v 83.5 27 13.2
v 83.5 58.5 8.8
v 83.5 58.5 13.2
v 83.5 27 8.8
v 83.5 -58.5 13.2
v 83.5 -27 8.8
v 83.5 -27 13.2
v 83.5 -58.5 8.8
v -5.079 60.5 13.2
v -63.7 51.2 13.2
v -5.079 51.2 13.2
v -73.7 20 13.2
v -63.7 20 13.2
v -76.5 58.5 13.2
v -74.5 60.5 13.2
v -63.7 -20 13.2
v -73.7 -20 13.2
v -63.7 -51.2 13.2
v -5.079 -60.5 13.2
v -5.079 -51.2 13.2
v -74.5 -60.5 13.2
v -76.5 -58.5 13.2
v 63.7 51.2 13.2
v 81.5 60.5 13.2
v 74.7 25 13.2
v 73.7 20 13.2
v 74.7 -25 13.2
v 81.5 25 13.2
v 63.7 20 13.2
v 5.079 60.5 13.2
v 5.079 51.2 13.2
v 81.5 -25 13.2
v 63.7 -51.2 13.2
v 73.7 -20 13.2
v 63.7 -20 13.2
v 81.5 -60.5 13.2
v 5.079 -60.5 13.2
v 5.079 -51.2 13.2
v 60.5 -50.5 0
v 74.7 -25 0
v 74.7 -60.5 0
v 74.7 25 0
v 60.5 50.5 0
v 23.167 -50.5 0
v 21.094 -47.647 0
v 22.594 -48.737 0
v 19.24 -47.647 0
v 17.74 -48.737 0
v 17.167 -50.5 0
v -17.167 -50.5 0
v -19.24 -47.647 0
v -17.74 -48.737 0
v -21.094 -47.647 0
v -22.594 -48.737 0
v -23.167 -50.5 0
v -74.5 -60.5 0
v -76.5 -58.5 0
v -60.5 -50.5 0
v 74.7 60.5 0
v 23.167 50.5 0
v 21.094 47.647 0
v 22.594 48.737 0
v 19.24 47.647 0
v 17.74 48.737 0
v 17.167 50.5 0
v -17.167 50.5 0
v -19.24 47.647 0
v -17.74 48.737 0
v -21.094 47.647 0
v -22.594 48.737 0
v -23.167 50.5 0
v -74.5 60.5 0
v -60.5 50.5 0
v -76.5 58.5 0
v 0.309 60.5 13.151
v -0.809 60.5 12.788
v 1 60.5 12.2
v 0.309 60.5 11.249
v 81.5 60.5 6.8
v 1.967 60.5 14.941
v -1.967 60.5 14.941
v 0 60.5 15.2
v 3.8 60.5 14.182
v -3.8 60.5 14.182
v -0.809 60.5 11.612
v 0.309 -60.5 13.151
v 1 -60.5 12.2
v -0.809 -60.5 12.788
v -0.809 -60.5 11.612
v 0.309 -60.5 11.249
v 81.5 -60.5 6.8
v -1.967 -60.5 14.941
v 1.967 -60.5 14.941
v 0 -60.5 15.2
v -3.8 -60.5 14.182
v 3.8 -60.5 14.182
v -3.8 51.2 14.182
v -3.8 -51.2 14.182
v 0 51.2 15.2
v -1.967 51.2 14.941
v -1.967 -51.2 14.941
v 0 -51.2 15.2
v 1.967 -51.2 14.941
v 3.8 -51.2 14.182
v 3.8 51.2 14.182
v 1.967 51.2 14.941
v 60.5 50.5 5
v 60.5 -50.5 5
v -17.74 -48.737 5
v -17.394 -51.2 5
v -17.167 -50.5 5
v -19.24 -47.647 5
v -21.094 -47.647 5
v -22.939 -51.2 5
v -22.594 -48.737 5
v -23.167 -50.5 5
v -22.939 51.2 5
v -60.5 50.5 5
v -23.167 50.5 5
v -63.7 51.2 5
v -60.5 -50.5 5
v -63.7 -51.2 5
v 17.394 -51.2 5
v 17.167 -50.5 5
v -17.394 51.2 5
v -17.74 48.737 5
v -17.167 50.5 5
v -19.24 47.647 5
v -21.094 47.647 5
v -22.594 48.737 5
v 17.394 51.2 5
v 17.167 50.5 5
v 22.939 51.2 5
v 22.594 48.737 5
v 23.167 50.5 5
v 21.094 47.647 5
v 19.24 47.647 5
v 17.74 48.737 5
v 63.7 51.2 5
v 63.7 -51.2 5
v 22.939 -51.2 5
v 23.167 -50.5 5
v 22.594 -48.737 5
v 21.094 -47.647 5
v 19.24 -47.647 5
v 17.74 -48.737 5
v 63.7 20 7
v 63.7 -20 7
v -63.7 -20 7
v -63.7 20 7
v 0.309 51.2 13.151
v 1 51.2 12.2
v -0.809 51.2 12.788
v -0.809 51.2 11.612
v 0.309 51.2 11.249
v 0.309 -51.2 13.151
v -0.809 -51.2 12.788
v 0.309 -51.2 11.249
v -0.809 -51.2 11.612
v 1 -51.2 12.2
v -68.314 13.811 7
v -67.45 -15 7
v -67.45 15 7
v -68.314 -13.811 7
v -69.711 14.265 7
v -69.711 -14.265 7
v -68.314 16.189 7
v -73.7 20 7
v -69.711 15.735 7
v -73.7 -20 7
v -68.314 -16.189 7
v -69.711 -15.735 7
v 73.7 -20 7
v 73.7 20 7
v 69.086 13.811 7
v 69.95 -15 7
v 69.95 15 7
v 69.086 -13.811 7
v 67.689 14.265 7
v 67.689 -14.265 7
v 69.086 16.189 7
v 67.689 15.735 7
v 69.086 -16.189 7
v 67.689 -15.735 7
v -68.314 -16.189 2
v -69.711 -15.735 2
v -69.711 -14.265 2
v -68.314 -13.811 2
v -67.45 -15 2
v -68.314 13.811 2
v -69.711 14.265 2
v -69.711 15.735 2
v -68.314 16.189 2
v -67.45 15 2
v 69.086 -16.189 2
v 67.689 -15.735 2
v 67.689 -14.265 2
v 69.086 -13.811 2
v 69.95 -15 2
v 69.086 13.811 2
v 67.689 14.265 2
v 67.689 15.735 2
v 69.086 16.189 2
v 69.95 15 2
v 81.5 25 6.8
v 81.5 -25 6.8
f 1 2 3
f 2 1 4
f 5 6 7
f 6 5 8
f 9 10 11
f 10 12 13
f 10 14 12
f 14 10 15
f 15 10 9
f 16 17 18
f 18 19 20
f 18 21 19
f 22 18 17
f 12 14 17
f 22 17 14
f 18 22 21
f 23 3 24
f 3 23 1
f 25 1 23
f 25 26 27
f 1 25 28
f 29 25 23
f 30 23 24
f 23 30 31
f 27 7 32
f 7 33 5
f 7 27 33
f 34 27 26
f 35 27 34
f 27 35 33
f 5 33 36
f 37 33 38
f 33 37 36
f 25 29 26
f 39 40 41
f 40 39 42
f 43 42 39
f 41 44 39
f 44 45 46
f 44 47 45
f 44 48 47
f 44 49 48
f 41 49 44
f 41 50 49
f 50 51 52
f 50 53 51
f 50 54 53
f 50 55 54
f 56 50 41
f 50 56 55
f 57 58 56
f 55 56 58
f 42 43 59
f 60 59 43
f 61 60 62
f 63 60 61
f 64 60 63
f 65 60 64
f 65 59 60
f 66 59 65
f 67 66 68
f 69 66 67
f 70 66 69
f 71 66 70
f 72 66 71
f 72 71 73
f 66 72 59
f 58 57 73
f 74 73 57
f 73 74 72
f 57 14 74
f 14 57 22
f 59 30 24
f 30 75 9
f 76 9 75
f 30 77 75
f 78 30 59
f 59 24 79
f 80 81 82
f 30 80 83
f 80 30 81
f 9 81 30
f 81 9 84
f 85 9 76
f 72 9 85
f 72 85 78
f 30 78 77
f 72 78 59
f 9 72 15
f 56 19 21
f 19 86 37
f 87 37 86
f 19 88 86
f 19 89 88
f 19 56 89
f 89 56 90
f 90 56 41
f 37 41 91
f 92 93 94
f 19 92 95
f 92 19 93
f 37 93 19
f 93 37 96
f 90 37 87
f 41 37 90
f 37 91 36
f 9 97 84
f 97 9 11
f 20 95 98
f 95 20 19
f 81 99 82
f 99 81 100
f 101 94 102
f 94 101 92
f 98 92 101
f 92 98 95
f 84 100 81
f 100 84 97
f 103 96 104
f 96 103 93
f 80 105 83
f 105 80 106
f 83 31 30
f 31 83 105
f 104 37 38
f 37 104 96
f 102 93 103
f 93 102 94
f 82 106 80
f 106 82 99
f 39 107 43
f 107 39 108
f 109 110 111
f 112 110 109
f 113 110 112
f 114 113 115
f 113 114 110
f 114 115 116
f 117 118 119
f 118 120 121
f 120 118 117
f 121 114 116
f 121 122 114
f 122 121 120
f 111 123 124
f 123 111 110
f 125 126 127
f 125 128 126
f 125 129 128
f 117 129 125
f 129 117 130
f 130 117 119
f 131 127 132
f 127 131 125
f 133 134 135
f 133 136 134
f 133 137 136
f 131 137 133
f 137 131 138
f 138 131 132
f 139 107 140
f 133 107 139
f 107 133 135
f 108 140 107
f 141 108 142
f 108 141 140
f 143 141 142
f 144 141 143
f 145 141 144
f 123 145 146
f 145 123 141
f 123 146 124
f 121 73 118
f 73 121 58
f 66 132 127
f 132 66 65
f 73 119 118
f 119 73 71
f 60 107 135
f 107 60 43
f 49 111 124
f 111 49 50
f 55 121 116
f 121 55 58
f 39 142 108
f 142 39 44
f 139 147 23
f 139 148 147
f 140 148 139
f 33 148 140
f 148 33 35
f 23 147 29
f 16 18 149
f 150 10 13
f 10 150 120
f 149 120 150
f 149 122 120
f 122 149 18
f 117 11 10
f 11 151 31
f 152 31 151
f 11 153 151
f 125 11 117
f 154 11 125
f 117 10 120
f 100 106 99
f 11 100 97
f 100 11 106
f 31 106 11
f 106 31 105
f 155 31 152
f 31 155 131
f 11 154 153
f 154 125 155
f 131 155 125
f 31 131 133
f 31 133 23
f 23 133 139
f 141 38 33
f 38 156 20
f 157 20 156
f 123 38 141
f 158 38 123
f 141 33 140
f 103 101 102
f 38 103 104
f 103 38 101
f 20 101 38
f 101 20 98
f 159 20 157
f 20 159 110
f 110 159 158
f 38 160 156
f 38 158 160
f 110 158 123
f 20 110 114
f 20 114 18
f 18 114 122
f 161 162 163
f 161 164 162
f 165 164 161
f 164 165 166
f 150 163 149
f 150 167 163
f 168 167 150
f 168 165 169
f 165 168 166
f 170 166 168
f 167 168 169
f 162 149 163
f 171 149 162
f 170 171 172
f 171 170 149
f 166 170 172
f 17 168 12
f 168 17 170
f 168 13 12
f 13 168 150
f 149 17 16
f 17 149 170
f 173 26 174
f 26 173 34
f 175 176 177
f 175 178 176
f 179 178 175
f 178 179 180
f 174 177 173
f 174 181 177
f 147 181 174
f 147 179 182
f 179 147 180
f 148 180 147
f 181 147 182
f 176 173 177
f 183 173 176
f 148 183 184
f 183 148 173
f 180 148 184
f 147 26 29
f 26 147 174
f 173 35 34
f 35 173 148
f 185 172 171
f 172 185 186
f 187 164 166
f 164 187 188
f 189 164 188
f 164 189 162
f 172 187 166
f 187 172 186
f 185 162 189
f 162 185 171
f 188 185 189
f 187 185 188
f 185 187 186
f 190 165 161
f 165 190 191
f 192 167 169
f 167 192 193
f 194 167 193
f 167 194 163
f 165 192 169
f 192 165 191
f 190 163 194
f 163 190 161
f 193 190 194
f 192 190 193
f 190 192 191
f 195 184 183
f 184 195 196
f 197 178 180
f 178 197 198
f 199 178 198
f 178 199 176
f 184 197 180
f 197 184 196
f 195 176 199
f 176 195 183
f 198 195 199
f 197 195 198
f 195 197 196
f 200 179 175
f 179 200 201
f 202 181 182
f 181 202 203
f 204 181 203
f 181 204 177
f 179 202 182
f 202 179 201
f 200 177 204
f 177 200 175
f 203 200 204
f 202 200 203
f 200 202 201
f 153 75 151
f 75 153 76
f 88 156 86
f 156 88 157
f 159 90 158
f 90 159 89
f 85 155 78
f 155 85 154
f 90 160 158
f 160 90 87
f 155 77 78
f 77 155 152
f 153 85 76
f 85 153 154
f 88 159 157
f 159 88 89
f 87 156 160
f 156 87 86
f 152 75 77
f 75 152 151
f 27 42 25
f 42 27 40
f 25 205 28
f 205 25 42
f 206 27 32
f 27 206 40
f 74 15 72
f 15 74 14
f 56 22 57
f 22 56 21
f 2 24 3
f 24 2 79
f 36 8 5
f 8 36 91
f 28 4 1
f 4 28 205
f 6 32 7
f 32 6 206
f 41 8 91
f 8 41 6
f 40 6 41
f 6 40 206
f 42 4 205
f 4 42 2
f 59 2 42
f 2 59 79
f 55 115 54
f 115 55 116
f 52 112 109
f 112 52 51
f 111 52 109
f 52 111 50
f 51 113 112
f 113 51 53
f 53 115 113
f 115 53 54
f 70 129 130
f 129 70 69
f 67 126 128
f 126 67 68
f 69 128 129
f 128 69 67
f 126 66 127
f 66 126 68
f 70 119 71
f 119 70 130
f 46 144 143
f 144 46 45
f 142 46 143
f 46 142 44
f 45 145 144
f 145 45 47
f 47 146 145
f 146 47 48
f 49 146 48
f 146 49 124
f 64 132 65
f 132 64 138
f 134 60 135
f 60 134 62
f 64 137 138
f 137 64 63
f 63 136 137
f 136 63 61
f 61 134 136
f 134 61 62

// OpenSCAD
// file: config_4x5.scad
/*
This is the base configuration file for the 4x5" format
# we are not using the exact ANSI measures, but slightly rounded measures for slight simplification
*/
vStabilizerTotal_h = 7;

// general tolerance
vTolerance = 0.2;

// sheet film and cassette measurements (roughly based on the ANSI measurements)
vFilmSheet_l = 127;
vFilmSheet_w = 102;
vCassette_l = 160; // A min
vCassette_w = 121; // B max
vCassette_h = 13.2; // C max
vLightTrap_l = 2; // M2
vLightTrap_w = vCassette_w;
vLightTrap_h = 1.5; // M1
vLightTrap_offsetX = 141; // G max
vFilmWindow_l = 121;
vFilmWindow_w = 101;
vFilmWindow_offsetX = 16;
vGroundGlass_offsetZ = 5;

// Graflok
vGraflok_h = 6; // this is not the official measurement, just measured from a camera 

// lens board measures (we are using Wista/Technika-style lensboards)
vLensboard_l = 100;
vLensboard_w = 97;
vLensboard_h = 2;
vLensboard_offsetX = -(vLensboard_l+3)/2; // caution: we have an asymetric offset!
vLensboard_offsetY = -vLensboard_w/2;
vLensboardHole_d = 85;
vLensboardLighttrap_d = 89;
vLensboardLighttrap_h = 1+vTolerance;

// bellows frame measures - the bellows frame design is derived from standardcameras.com
// back frame
vBellowsBackInner_l = 144; //???? check and replace with the measurement from your bellows!
vBellowsBackInner_w = vBellowsBackInner_l;
vBellowsBackOuter_l = vBellowsBackInner_l+1;
vBellowsBackOuter_w = vBellowsBackOuter_l;

vBellowsBackFrameOuter_l = 159;
vBellowsBackFrameOuter_w = vBellowsBackFrameOuter_l;
vBellowsBackFrameOuter_h = 7;
vBellowsBackFrameInner_l = 135;
vBellowsBackFrameInner_w = vBellowsBackFrameInner_l;
vBellowsBackFrameInner_h = 5;

vBellowsBackLightTrapOuter_l = vBellowsBackFrameInner_l+2*2;
vBellowsBackLightTrapOuter_w = vBellowsBackLightTrapOuter_l;
vBellowsBackLightTrap_h = 3;

vBellowsBackFrameScrewHole_d = 2;
vBellowsBackFrameScrewHole_h = 10;
vBellowsBackFrameScrewHole_offsetXY = 70;
vBellowsBackFrameScrewHole_offsetZ = vBellowsBackFrameOuter_h/2;

// front frame
vBellowsFrontInner_l = 94; //???? check and replace with the measurement from your bellows!
vBellowsFrontInner_w = vBellowsFrontInner_l;
vBellowsFrontOuter_l = vBellowsFrontInner_l+1;
vBellowsFrontOuter_w = vBellowsFrontOuter_l;

vBellowsFrontFrameOuter_l = 104;
vBellowsFrontFrameOuter_w = vBellowsFrontFrameOuter_l;
vBellowsFrontFrameOuter_h = 7;
vBellowsFrontFrameInner_l = 82;
vBellowsFrontFrameInner_w = vBellowsFrontFrameInner_l;
vBellowsFrontFrameInner_h = 5;

vBellowsFrontLightTrapOuter_l = vBellowsFrontFrameInner_l+2*2;
vBellowsFrontLightTrapOuter_w = vBellowsFrontLightTrapOuter_l;
vBellowsFrontLightTrap_h = 0;

vBellowsFrontFrameScrewHole_d = 2;
vBellowsFrontFrameScrewHole_h = 10;
vBellowsFrontFrameScrewHole_offsetXY = 40;
vBellowsFrontFrameScrewHole_offsetZ = vBellowsFrontFrameOuter_h/2;

// body dimensions
vWall_strength = 5;
vBodyOuter_l = 185; // make sure this is at least 4*vWall_strength larger than vBellowsBackFrameOuter_l!
vBodyOuter_w = 170; // make sure this is at least 2*vWall_strength larger than vBellowsBackFrameOuter_l!
vBodyOuter_h = 65;
vBodyEdge_r = vWall_strength;

// we will center our model on the Y axis and on the center of the bellows frame
// at least for the 4x5 version, we have to do an asymetric offset of 2.5mm on the X-axis 
vAsymOffsetX = -2.5;  

// back plate
vBackPlateLength = 160; // we will probably use about the same size as the bellows back frame
vBackPlateStrength = vWall_strength;

// hinges for front lid
vHingeInnerDistance = 100;
vHingeBaseWidth = 20;
vHingeHole = 5;

// lid lock measures
vLidLockBase_d = 8;
vLidLockHole_distance = 70;

// rail dimensions
vLowerRail_w = 90;
vUpperRail_w = vLowerRail_w;

// cutout for stop indents
vStopIndent_l = 4;
vStopIndent_h = 5;
vStopIndentDistance = 25; // shorter than 25 is not necessary
vStopIndent_offsetX = 20; // don't go shorter than 20 if you intend to use a 90mm lens!

// for all dovetails we use a base width of 5mm and a base height of 5mm
// we are applying tolerances to the inner AND outer part of a dovetail, in width and height
vDoveTail_w = 5;
vDoveTail_h = 5;
vDoveTail_tolerance = 0.2;

// front standard carrier / slider
// width is depending on vUpperRail_w
vSliderBase_w = vUpperRail_w + (4*vDoveTail_w);
vSliderBase_l = 40; // make sure to have enough space in the body.


// lever plate 
vLeverPlateBase_w = vUpperRail_w - (8*vDoveTail_w);
vLeverPlateBlock_w = 25;
vLeverPlateBlock_l = vSliderBase_l-(2*vDoveTail_w);

vFrontStandard_h = 130;
vFrontStandardSlot_h = vFrontStandard_h - 30;

// lensboard carrier
vFrontPlate_length = vSliderBase_w+6; // vSliderBase_w is a bit too tight for 4x5", so there we will add 5mm, for 5x7 vSliderBase_w is OK to get a squared lensboard carrier
vFrontPlate_width = vSliderBase_w; //vFrontPlate_length;
vFrontPlate_height = 16;
vEdgeCutCylinder = floor(sqrt(2*pow(vFrontPlate_width,2)))-5;

vTiltDovetailBase_d1 = 30;
vTiltDovetailBase_d2 = vTiltDovetailBase_d1+(2*vDoveTail_w);
vTiltDovetailBaseBlock_d = vTiltDovetailBase_d1+(4*vDoveTail_w);

vTiltDovetail_d1 = vTiltDovetailBase_d1-vTolerance;
vTiltDovetail_d2 = vTiltDovetailBase_d2-vTolerance;
vTiltDovetail_h = vDoveTail_w-vTolerance;

vTiltDovetailCutout_d1 = vTiltDovetailBase_d2+vTolerance;
vTiltDovetailCutout_d2 = vTiltDovetailBase_d1+vTolerance;

vAxisHole_d = 10+vTolerance;
vAxisHole_h = vDoveTail_w+vTolerance;

vTiltLockBolt_d = 12;
vTiltLockBolt_h = 14;
vTiltLockBoltHole_d = 8;
vTiltLockBoltHole_h = vTiltLockBolt_h;

vTiltHeight = 50;
vTiltRadius = vFrontPlate_length/2;
vTiltAngleMinus = -7;
vTiltAnglePlus = 7;
vTiltAxis_d = 10-vTolerance;

// focusing rod
vFocusingRod_d = 6;
vFocusingKnob_d = 25;
vFocusingKnob_h = 20;

// stabilizer measures (just the outer measures of our stabilizer block, not the tripod slider)
vStabilizerBase_l = 135;
vStabilizerBase_w = 90;  
vStabilizerBase_h = 7;
vStabilizerDovetailBase_w = 50;
// screw holes for the stabilizer
vLidHoleCount_x = 4;
vLidHoleDist_x = 35;
vLidHoleCount_y = 2;
vLidHoleDist_y = 60;


// screw diameters, length is individually set
vScrew1Hole_d = 3;
vScrew1ThreadHole_d = 2.2;
vScrew2Hole_d = 2;
vScrew2ThreadHole_d = 1.4;


 
// file: modules.scad
/*
This is a collection of the modules which are used heavily within the whole project.
Almost all parts rely on the modules to remain "as is", especially regarding their current orientation.
So please act very carefully here, otherwise you may screw up the complete design!

*/
include <baseconfig.scad>;


// roof module - this is heavily used for dovetail cutouts
// please keep as is
module roof(l, w, h){
    polyhedron(
        points=[
            [0,0,0],
            [l,0,0],
            [l,w,0],
            [0,w,0],
            [0,w/2,h],
            [l,w/2,h]
            ],
        faces=[
            [0,1,2,3],
            [0,4,1],
            [1,4,5,2],
            [2,5,3],
            [3,5,4,0]
            ]
            );
    };

// a wedge module - this is heavily used for cutting edges
// please keep as is    
module wedge(l, w, h) {
    polyhedron(
            points=[
                [0,0,0],
                [l,0,0],
                [l,w,0],
                [0,w,0],
                [0,0,h],
                [l,0,h]
            ],
            faces=[
                [0,3,2,1],
                [0,1,5,4],
                [1,2,5],
                [2,3,4,5],
                [3,0,4]
            ]
    );
   };

// simple tube module.   
module tube(d1, d2, h) {
    difference() {
        cylinder(d=d1, h=h);
        cylinder(d=d2, h=h);
        };
    };

// mainly used for making holes for countersunk screws
// please keep as is    
module countersunk_screw(vScrew_d, vScrew_l){
    union(){
    cylinder(d=vScrew_d, h=vScrew_l);
    cylinder(d1=vScrew_d*2, d2=0, h=vScrew_d);
    };
};

// module for making hexagons, e.g. hex nuts. kw is the key width
// please keep as is
module hex(kw, h) {
	render()
        translate([0, 0, h/2])
            intersection_for(a = [0, 120, 240]) {
                rotate([0, 0, a])
                    cube([kw, 3 * kw, h], true);
                }
}


// Heatset insert
// d: Thread diameter
// od: Outer diameter
// l: Total length
module insert(d, od, l)
{
    echo(Insert = d, od, l);
    difference() {
        cylinder(l, d=od, $fn=15);
        translate([0, 0, -0.5]) cylinder(l+1, d=d, $fn=15);
        };
}

module insert_m2()
{
    color("gold") insert(2, vInsertM2Size_d, vInsertM2Depth_h);
}

module insert_m3()
{
    color("gold") insert(3, vInsertM3Size_d, vInsertM3Depth_h);
}

module insert_m5()
{
    color("gold") insert(5, vInsertM5Size_d, vInsertM5Depth_h);
}

// Countersunk screw, metric, for display
// Example: https://www.aliexpress.com/item/1005007838338973.html
module screw_cs(l, d=3, dk=6, s=2, t=1) {
    // l: total length (including head) in mm
    // d: thread diameter (eg 3 for M3)
    // dk: max head diameter
    // s: hex socket flat-to-flat size
    // t: hex socket depth
    echo(CountersunkScrew = d, l);
    difference() {
        union() {
            cylinder(h=l, r=d/2, $fn=15);
            cylinder(h=(dk-d)/2, r1=dk/2, r2=d/2, $fn=15);
            }
        cylinder(h=t, r=s/2*2/sqrt(3), $fn=6);
    }
}

module screw_m3_cs(l) {
    color("silver") screw_cs(l, d=3, dk=6, s=2, t=1);
}

module screw_m2_cs(l) {
    color("silver") screw_cs(l, d=2, dk=3.8, s=1.5, t=0.75);
}
module screw_m5_cs(l) {
    color("silver") screw_cs(l, d=5, dk=9.5, s=3, t=1.6);
}

// Button head screw, metric, for display
// Example: https://www.aliexpress.com/item/32967225441.html
module screw_bh(l, d=3, k=1.5, dk=5.5, s=2, t=1) {
    // l: shaft length (NOT including head) in mm
    // d: thread diameter (eg 3 for M3)
    // k: head depth
    // dk: head max diameter
    // s: hex socket flat-to-flat size
    // t: hex socket depth
    echo(BallheadScrew = d, l);
    difference() {
        union() {
            translate([0, 0, k]) cylinder(h=l, r=d/2, $fn=15);
            difference() {
                translate([0, 0, k]) intersection() {
                    sphere(d=dk, $fn=15);
                    translate([-dk/2, -dk/2, -dk]) cube(dk);
                }
                translate([-dk/2, -dk/2, -dk]) cube(dk);
            }
        }
        cylinder(h=t, r=s/2*2/sqrt(3), $fn=6);
    }
}

module screw_m2_bh(l) {
    color("silver") screw_bh(l, d=2, dk=3.4, s=1.175, t=0.6);
}

module screw_m3_bh(l) {
    color("silver") screw_bh(l, d=3, dk=5.7, s=2, t=1);
}


module nut_m5() {
    echo(Nut = 5);
    difference() {
        rotate([0, 0, 30]) cylinder(h=3.9, d=8*2/sqrt(3), $fn=6);
        cylinder(h=5, d=5, $fn=15);
        }
    }
    
    
module thumbscrew(bolt_d, bolt_dk, screw_d, screw_h, n_knurls, knurl_d, knurl_f) {
    // bolt_d:  central bolt diameter
    // bolt_dk: bolt head max diameter
    // screw_d: thumbscrew outer diameter
    // screw_h: thumbscrew height
    // n_knurls: number of knurls
    
    min_knurl_offset = screw_d/2 - knurl_d;
    max_knurl_offset = screw_d/2 + knurl_d;
    knurl_offset = min_knurl_offset + knurl_f*(max_knurl_offset - min_knurl_offset);
    
    difference()
    {
        union()
        {
            translate([0, 0, 1]) cylinder(screw_h-2, d=screw_d);
            cylinder(1, d1=screw_d-1, d2=screw_d);
            translate([0, 0, screw_h-1]) cylinder(1, d1=screw_d, d2=screw_d-1);
        }
        cylinder(screw_h, d=bolt_d);
        cylinder(bolt_dk/2, d1=bolt_dk, d2=0);
        for (i = [1:n_knurls])
        {
            rotate([0, 0, i*360/(n_knurls)]) translate([knurl_offset, 0, 0]) cylinder(screw_h, d=knurl_d);
        }
    }
}

module thumbscrew_m5(screw_d, screw_h, n_knurls, knurl_d, knurl_f) {
    thumbscrew(5, 9.5, screw_d, screw_h, n_knurls, knurl_d, knurl_f);
}


module t6_flange_coupler() {
    // T6 flange coupler
    // Example: https://www.aliexpress.com/item/1005008049363389.html
    echo(FlangeCoupler = 6);
    difference() {
        union() {
            translate([0, 0, 2]) cylinder(h=10, d=10);
            cylinder(h=2, d=22);
        }
        cylinder(h=12, d=6);
        translate([0, 15, 7]) rotate([90, 0, 0]) cylinder(h=30, d=3);
        for (i = [0:3]) {
            rotate([0, 0, 45+90*i]) translate([-8, 0, 0]) cylinder(h=2, d=3);
        }
    }
}


module AXK0619_thrust_bearing() {
    echo(ThrustBearing = "AXK0619");
    difference() {
        cylinder(h=4, d=19);
        cylinder(h=4, d=6);
    }
}


module t6_lead_screw(l) {
    echo(LeadScrewT6 = l);
    color("silver") cylinder(h=l, d=6);
}

module t6_lead_screw_nut() {
    echo("LeadScrewT6Nut");
    intersection()
    {
        difference() {
            union() {
                cylinder(h=15, d=12);
                translate([0, 0, 1.5]) cylinder(h=3.5, d=24);
            }
            cylinder(h=15, d=6);
        }  
        translate([-50, -12.5/2, -50]) cube([100, 12.5, 100]);
    }
}

module m5_rod(l) {
    echo(ThreadedRodM5 = l);
    color("silver") cylinder(h=l, d=5);
}


module screw_m3_grub(l) {
    echo(GrubScrew = 3, l);
    cylinder(h=l, d=3, $fn=15);
}
// file: baseconfig.scad
/*
Here we define some variables which are independent from the camera format
*/


// some generic variables

// we are including a format specific configuration sheet - but make sure to include only one!

include <config_4x5.scad>;
// include <config_5x7.scad>;
// include <config_8x10.scad>;

// Arca Swiss tripod plate
// caution: some Arca Swiss compatible tripod heads may have slight variations
// vArca_length = xx; // the length is irrelevant here
vArca_width = 38;
vArca_height = 7;
vArcaBase_cutout = 4;
vArcaBase_height = 1.5;
// main file
// loading the base configuration
include <baseconfig.scad>;

// some modules such as hex, countersunk screws, roof, wedge are available in a module file
use <modules.scad>;

module ground_glass_frame() {

// variables

// this are raw measurements - we will derive the final measurements for our model from them

vGG_thickness = 2;
vGG_plane_offset = vGroundGlass_offsetZ;
vCassetteLowerBorder = vFilmWindow_offsetX; // Distance from lower border to window frame
vHolder_height = 2;



vGGFrame_l = vCassette_l ;
vGGFrame_w = vCassette_w;
vGGFrame_h = vCassette_h;
vGGFrame_offsetX = -vFilmWindow_l/2-vCassetteLowerBorder;
vGGFrame_offsetY = -vGGFrame_w/2;
vGGFrame_offsetZ = 0;

vGGHolder_d = vGGFrame_h+vHolder_height;
vGGHolder_h = vGGFrame_w;
vGGHolder_offsetX = 0;
vGGHolder_offsetY = -vGGHolder_h/2;
vGGHolder_offsetZ = vGGHolder_d/2;

vGGHolderHole_d = 2;
vGGHolderHole_h = vGGHolder_h;
vGGHolderHole_offsetX = 0;
vGGHolderHole_offsetY = -vGGHolder_h/2;
vGGHolderHole_offsetZ = vGGFrame_h-(vGGHolderHole_d/2);

vWindowCutout_l = vFilmWindow_l;
vWindowCutout_w = vFilmWindow_w;
vWindowCutout_h = vGG_plane_offset;
vWindowCutout_offsetX = -vWindowCutout_l/2;
vWindowCutout_offsetY = -vWindowCutout_w/2;
vWindowCutout_offsetZ = 0;

vGGFrameCutout_l = vFilmSheet_l+(2*vTolerance);
vGGFrameCutout_w = vFilmSheet_w+(2*vTolerance);
vGGFrameCutout_h = vGGFrame_h;
vGGFrameCutout_offsetX = -vGGFrameCutout_l/2;
vGGFrameCutout_offsetY = -vGGFrameCutout_w/2;
vGGFrameCutout_offsetZ = vGG_plane_offset;

vGGBed_d = 6;
vGGBed_h = vWindowCutout_h;
vGGBed_offsetX = -vFilmWindow_l/3/2;
vGGBed_offsetY = -vWindowCutout_w/2;
vGGBed_offsetZ = 0;

vGGClampCutout_l = 10;
vGGClampCutout_w = 40;
vGGClampCutout_h = vGGFrame_h-vWindowCutout_h+vGG_thickness;
vGGClampCutout_offsetX1 = -(vGGFrameCutout_l/2) - vGGClampCutout_l;
vGGClampCutout_offsetX2 = (vGGFrameCutout_l/2);
vGGClampCutout_offsetY = -(vGGClampCutout_w/2);
vGGClampCutout_offsetZ = vGG_plane_offset+vGG_thickness;

vGGClampHole_d = 2.5;
vGGClampHole_h = vGGFrame_h;
vGGClampHole_offsetX1 = -(vGGFrameCutout_l/2) - (vGGClampCutout_l/2);
vGGClampHole_offsetX2 = (vGGFrameCutout_l/2) + (vGGClampCutout_l/2);
vGGClampHole_offsetY = -15;
vGGClampHole_offsetZ = 2;


vFrontCutout_l = 2/3*vGGFrame_h;
vFrontCutout_w = 50;
vFrontCutout_h = vGGFrame_h;
vFrontCutout_offsetX = vGGFrame_offsetX + vGGFrame_l-vFrontCutout_l;
vFrontCutout_offsetY = -vFrontCutout_w/2;
vFrontCutout_offsetZ = 0;

vLowerFrontRamp_l = 2/3*vGGFrame_h;
vLowerFrontRamp_w = vGGFrame_w;
vLowerFrontRamp_h = vLowerFrontRamp_l;
vLowerFrontRamp_offsetX = vGGFrame_offsetX + vGGFrame_l;
vLowerFrontRamp_offsetY = -vLowerFrontRamp_w/2;
vLowerFrontRamp_offsetZ = 0;

vEdgeCut = 2;
vEdgeCut_h = vGGFrame_h;
vEdgeCut_offsetX1 = vGGFrame_offsetX;
vEdgeCut_offsetX2 = vGGFrame_offsetX + vGGFrame_l;
vEdgeCut_offsetY = -vGGFrame_w/2;
vEdgeCut_offsetY2 = -vFrontCutout_w/2;
vEdgeCut_offsetZ = 0;


union(){
    difference(){
        
        union(){
            translate([vGGFrame_offsetX, vGGFrame_offsetY, vGGFrame_offsetZ])
                cube([vGGFrame_l, vGGFrame_w, vGGFrame_h]);
            
            translate([vGGHolder_offsetX, vGGHolder_offsetY, vGGHolder_offsetZ])
                rotate([-90, 0, 0])
                cylinder(d=vGGHolder_d, h=vGGHolder_h);
            
            
            };
        // window cutout
        translate([vWindowCutout_offsetX, vWindowCutout_offsetY, vWindowCutout_offsetZ])
            cube([vWindowCutout_l, vWindowCutout_w, vWindowCutout_h]);
        
        // GG frame cutout
        translate([vGGFrameCutout_offsetX, vGGFrameCutout_offsetY, vGGFrameCutout_offsetZ])
            cube([vGGFrameCutout_l, vGGFrameCutout_w, vGGFrameCutout_h]);
        
        // GG clamp cutout
        translate([vGGClampCutout_offsetX1, vGGClampCutout_offsetY, vGGClampCutout_offsetZ])
            cube([vGGClampCutout_l, vGGClampCutout_w, vGGClampCutout_h]);
        translate([vGGClampCutout_offsetX2, vGGClampCutout_offsetY, vGGClampCutout_offsetZ])
            cube([vGGClampCutout_l, vGGClampCutout_w, vGGClampCutout_h]);
        
        // GG clamp holes
        translate([vGGClampHole_offsetX1, vGGClampHole_offsetY, vGGClampHole_offsetZ])
            cylinder(d=vGGClampHole_d, h=vGGClampHole_h);
        translate([vGGClampHole_offsetX1, -vGGClampHole_offsetY, vGGClampHole_offsetZ])
            cylinder(d=vGGClampHole_d, h=vGGClampHole_h);
        translate([vGGClampHole_offsetX2, vGGClampHole_offsetY, vGGClampHole_offsetZ])
            cylinder(d=vGGClampHole_d, h=vGGClampHole_h);
        translate([vGGClampHole_offsetX2, -vGGClampHole_offsetY, vGGClampHole_offsetZ])
            cylinder(d=vGGClampHole_d, h=vGGClampHole_h);
        
        // GG holder hole
        translate([vGGHolderHole_offsetX, vGGHolderHole_offsetY, vGGHolderHole_offsetZ])
            rotate([-90, 0, 0])
                cylinder(d=vGGHolderHole_d, h=vGGHolderHole_h);
        
        //front cutout
        translate([vFrontCutout_offsetX, vFrontCutout_offsetY, vFrontCutout_offsetZ])
            cube([vFrontCutout_l, vFrontCutout_w, vFrontCutout_h]);
        
        // edge cut
        translate([vEdgeCut_offsetX1, -vEdgeCut_offsetY, vEdgeCut_offsetZ])
            rotate([0, 270, 0])
                wedge(vEdgeCut_h, -vEdgeCut, -vEdgeCut);
        translate([vEdgeCut_offsetX1, vEdgeCut_offsetY, vEdgeCut_offsetZ])
            rotate([0, 270, 0])
                wedge(vEdgeCut_h, vEdgeCut, -vEdgeCut);
        translate([vEdgeCut_offsetX2, -vEdgeCut_offsetY, vEdgeCut_offsetZ])
            rotate([0, 270, 0])
                wedge(vEdgeCut_h, -vEdgeCut, vEdgeCut);
        translate([vEdgeCut_offsetX2, vEdgeCut_offsetY, vEdgeCut_offsetZ])
            rotate([0, 270, 0])
                wedge(vEdgeCut_h, vEdgeCut, vEdgeCut);
        translate([vEdgeCut_offsetX2, -vEdgeCut_offsetY2, vEdgeCut_offsetZ])
            rotate([0, 270, 0])
                wedge(vEdgeCut_h, vEdgeCut, vEdgeCut);
        translate([vEdgeCut_offsetX2, vEdgeCut_offsetY2, vEdgeCut_offsetZ])
            rotate([0, 270, 0])
                wedge(vEdgeCut_h, -vEdgeCut, vEdgeCut);
         
        // lower front cut
        translate([vLowerFrontRamp_offsetX, vLowerFrontRamp_offsetY, vLowerFrontRamp_offsetZ])
            rotate([0, 0, 90])
                wedge(vLowerFrontRamp_w, vLowerFrontRamp_l, vLowerFrontRamp_h);
    };
    // GG bed
    translate([vGGBed_offsetX, vGGBed_offsetY, vGGBed_offsetZ])
        cylinder(d=vGGBed_d , h=vGGBed_h);
    translate([vGGBed_offsetX, -vGGBed_offsetY, vGGBed_offsetZ])
        cylinder(d=vGGBed_d , h=vGGBed_h);
    translate([-vGGBed_offsetX, vGGBed_offsetY, vGGBed_offsetZ])
        cylinder(d=vGGBed_d , h=vGGBed_h);
    translate([-vGGBed_offsetX, -vGGBed_offsetY, vGGBed_offsetZ])
        cylinder(d=vGGBed_d , h=vGGBed_h);
    
    
};    
     
};

ground_glass_frame();
